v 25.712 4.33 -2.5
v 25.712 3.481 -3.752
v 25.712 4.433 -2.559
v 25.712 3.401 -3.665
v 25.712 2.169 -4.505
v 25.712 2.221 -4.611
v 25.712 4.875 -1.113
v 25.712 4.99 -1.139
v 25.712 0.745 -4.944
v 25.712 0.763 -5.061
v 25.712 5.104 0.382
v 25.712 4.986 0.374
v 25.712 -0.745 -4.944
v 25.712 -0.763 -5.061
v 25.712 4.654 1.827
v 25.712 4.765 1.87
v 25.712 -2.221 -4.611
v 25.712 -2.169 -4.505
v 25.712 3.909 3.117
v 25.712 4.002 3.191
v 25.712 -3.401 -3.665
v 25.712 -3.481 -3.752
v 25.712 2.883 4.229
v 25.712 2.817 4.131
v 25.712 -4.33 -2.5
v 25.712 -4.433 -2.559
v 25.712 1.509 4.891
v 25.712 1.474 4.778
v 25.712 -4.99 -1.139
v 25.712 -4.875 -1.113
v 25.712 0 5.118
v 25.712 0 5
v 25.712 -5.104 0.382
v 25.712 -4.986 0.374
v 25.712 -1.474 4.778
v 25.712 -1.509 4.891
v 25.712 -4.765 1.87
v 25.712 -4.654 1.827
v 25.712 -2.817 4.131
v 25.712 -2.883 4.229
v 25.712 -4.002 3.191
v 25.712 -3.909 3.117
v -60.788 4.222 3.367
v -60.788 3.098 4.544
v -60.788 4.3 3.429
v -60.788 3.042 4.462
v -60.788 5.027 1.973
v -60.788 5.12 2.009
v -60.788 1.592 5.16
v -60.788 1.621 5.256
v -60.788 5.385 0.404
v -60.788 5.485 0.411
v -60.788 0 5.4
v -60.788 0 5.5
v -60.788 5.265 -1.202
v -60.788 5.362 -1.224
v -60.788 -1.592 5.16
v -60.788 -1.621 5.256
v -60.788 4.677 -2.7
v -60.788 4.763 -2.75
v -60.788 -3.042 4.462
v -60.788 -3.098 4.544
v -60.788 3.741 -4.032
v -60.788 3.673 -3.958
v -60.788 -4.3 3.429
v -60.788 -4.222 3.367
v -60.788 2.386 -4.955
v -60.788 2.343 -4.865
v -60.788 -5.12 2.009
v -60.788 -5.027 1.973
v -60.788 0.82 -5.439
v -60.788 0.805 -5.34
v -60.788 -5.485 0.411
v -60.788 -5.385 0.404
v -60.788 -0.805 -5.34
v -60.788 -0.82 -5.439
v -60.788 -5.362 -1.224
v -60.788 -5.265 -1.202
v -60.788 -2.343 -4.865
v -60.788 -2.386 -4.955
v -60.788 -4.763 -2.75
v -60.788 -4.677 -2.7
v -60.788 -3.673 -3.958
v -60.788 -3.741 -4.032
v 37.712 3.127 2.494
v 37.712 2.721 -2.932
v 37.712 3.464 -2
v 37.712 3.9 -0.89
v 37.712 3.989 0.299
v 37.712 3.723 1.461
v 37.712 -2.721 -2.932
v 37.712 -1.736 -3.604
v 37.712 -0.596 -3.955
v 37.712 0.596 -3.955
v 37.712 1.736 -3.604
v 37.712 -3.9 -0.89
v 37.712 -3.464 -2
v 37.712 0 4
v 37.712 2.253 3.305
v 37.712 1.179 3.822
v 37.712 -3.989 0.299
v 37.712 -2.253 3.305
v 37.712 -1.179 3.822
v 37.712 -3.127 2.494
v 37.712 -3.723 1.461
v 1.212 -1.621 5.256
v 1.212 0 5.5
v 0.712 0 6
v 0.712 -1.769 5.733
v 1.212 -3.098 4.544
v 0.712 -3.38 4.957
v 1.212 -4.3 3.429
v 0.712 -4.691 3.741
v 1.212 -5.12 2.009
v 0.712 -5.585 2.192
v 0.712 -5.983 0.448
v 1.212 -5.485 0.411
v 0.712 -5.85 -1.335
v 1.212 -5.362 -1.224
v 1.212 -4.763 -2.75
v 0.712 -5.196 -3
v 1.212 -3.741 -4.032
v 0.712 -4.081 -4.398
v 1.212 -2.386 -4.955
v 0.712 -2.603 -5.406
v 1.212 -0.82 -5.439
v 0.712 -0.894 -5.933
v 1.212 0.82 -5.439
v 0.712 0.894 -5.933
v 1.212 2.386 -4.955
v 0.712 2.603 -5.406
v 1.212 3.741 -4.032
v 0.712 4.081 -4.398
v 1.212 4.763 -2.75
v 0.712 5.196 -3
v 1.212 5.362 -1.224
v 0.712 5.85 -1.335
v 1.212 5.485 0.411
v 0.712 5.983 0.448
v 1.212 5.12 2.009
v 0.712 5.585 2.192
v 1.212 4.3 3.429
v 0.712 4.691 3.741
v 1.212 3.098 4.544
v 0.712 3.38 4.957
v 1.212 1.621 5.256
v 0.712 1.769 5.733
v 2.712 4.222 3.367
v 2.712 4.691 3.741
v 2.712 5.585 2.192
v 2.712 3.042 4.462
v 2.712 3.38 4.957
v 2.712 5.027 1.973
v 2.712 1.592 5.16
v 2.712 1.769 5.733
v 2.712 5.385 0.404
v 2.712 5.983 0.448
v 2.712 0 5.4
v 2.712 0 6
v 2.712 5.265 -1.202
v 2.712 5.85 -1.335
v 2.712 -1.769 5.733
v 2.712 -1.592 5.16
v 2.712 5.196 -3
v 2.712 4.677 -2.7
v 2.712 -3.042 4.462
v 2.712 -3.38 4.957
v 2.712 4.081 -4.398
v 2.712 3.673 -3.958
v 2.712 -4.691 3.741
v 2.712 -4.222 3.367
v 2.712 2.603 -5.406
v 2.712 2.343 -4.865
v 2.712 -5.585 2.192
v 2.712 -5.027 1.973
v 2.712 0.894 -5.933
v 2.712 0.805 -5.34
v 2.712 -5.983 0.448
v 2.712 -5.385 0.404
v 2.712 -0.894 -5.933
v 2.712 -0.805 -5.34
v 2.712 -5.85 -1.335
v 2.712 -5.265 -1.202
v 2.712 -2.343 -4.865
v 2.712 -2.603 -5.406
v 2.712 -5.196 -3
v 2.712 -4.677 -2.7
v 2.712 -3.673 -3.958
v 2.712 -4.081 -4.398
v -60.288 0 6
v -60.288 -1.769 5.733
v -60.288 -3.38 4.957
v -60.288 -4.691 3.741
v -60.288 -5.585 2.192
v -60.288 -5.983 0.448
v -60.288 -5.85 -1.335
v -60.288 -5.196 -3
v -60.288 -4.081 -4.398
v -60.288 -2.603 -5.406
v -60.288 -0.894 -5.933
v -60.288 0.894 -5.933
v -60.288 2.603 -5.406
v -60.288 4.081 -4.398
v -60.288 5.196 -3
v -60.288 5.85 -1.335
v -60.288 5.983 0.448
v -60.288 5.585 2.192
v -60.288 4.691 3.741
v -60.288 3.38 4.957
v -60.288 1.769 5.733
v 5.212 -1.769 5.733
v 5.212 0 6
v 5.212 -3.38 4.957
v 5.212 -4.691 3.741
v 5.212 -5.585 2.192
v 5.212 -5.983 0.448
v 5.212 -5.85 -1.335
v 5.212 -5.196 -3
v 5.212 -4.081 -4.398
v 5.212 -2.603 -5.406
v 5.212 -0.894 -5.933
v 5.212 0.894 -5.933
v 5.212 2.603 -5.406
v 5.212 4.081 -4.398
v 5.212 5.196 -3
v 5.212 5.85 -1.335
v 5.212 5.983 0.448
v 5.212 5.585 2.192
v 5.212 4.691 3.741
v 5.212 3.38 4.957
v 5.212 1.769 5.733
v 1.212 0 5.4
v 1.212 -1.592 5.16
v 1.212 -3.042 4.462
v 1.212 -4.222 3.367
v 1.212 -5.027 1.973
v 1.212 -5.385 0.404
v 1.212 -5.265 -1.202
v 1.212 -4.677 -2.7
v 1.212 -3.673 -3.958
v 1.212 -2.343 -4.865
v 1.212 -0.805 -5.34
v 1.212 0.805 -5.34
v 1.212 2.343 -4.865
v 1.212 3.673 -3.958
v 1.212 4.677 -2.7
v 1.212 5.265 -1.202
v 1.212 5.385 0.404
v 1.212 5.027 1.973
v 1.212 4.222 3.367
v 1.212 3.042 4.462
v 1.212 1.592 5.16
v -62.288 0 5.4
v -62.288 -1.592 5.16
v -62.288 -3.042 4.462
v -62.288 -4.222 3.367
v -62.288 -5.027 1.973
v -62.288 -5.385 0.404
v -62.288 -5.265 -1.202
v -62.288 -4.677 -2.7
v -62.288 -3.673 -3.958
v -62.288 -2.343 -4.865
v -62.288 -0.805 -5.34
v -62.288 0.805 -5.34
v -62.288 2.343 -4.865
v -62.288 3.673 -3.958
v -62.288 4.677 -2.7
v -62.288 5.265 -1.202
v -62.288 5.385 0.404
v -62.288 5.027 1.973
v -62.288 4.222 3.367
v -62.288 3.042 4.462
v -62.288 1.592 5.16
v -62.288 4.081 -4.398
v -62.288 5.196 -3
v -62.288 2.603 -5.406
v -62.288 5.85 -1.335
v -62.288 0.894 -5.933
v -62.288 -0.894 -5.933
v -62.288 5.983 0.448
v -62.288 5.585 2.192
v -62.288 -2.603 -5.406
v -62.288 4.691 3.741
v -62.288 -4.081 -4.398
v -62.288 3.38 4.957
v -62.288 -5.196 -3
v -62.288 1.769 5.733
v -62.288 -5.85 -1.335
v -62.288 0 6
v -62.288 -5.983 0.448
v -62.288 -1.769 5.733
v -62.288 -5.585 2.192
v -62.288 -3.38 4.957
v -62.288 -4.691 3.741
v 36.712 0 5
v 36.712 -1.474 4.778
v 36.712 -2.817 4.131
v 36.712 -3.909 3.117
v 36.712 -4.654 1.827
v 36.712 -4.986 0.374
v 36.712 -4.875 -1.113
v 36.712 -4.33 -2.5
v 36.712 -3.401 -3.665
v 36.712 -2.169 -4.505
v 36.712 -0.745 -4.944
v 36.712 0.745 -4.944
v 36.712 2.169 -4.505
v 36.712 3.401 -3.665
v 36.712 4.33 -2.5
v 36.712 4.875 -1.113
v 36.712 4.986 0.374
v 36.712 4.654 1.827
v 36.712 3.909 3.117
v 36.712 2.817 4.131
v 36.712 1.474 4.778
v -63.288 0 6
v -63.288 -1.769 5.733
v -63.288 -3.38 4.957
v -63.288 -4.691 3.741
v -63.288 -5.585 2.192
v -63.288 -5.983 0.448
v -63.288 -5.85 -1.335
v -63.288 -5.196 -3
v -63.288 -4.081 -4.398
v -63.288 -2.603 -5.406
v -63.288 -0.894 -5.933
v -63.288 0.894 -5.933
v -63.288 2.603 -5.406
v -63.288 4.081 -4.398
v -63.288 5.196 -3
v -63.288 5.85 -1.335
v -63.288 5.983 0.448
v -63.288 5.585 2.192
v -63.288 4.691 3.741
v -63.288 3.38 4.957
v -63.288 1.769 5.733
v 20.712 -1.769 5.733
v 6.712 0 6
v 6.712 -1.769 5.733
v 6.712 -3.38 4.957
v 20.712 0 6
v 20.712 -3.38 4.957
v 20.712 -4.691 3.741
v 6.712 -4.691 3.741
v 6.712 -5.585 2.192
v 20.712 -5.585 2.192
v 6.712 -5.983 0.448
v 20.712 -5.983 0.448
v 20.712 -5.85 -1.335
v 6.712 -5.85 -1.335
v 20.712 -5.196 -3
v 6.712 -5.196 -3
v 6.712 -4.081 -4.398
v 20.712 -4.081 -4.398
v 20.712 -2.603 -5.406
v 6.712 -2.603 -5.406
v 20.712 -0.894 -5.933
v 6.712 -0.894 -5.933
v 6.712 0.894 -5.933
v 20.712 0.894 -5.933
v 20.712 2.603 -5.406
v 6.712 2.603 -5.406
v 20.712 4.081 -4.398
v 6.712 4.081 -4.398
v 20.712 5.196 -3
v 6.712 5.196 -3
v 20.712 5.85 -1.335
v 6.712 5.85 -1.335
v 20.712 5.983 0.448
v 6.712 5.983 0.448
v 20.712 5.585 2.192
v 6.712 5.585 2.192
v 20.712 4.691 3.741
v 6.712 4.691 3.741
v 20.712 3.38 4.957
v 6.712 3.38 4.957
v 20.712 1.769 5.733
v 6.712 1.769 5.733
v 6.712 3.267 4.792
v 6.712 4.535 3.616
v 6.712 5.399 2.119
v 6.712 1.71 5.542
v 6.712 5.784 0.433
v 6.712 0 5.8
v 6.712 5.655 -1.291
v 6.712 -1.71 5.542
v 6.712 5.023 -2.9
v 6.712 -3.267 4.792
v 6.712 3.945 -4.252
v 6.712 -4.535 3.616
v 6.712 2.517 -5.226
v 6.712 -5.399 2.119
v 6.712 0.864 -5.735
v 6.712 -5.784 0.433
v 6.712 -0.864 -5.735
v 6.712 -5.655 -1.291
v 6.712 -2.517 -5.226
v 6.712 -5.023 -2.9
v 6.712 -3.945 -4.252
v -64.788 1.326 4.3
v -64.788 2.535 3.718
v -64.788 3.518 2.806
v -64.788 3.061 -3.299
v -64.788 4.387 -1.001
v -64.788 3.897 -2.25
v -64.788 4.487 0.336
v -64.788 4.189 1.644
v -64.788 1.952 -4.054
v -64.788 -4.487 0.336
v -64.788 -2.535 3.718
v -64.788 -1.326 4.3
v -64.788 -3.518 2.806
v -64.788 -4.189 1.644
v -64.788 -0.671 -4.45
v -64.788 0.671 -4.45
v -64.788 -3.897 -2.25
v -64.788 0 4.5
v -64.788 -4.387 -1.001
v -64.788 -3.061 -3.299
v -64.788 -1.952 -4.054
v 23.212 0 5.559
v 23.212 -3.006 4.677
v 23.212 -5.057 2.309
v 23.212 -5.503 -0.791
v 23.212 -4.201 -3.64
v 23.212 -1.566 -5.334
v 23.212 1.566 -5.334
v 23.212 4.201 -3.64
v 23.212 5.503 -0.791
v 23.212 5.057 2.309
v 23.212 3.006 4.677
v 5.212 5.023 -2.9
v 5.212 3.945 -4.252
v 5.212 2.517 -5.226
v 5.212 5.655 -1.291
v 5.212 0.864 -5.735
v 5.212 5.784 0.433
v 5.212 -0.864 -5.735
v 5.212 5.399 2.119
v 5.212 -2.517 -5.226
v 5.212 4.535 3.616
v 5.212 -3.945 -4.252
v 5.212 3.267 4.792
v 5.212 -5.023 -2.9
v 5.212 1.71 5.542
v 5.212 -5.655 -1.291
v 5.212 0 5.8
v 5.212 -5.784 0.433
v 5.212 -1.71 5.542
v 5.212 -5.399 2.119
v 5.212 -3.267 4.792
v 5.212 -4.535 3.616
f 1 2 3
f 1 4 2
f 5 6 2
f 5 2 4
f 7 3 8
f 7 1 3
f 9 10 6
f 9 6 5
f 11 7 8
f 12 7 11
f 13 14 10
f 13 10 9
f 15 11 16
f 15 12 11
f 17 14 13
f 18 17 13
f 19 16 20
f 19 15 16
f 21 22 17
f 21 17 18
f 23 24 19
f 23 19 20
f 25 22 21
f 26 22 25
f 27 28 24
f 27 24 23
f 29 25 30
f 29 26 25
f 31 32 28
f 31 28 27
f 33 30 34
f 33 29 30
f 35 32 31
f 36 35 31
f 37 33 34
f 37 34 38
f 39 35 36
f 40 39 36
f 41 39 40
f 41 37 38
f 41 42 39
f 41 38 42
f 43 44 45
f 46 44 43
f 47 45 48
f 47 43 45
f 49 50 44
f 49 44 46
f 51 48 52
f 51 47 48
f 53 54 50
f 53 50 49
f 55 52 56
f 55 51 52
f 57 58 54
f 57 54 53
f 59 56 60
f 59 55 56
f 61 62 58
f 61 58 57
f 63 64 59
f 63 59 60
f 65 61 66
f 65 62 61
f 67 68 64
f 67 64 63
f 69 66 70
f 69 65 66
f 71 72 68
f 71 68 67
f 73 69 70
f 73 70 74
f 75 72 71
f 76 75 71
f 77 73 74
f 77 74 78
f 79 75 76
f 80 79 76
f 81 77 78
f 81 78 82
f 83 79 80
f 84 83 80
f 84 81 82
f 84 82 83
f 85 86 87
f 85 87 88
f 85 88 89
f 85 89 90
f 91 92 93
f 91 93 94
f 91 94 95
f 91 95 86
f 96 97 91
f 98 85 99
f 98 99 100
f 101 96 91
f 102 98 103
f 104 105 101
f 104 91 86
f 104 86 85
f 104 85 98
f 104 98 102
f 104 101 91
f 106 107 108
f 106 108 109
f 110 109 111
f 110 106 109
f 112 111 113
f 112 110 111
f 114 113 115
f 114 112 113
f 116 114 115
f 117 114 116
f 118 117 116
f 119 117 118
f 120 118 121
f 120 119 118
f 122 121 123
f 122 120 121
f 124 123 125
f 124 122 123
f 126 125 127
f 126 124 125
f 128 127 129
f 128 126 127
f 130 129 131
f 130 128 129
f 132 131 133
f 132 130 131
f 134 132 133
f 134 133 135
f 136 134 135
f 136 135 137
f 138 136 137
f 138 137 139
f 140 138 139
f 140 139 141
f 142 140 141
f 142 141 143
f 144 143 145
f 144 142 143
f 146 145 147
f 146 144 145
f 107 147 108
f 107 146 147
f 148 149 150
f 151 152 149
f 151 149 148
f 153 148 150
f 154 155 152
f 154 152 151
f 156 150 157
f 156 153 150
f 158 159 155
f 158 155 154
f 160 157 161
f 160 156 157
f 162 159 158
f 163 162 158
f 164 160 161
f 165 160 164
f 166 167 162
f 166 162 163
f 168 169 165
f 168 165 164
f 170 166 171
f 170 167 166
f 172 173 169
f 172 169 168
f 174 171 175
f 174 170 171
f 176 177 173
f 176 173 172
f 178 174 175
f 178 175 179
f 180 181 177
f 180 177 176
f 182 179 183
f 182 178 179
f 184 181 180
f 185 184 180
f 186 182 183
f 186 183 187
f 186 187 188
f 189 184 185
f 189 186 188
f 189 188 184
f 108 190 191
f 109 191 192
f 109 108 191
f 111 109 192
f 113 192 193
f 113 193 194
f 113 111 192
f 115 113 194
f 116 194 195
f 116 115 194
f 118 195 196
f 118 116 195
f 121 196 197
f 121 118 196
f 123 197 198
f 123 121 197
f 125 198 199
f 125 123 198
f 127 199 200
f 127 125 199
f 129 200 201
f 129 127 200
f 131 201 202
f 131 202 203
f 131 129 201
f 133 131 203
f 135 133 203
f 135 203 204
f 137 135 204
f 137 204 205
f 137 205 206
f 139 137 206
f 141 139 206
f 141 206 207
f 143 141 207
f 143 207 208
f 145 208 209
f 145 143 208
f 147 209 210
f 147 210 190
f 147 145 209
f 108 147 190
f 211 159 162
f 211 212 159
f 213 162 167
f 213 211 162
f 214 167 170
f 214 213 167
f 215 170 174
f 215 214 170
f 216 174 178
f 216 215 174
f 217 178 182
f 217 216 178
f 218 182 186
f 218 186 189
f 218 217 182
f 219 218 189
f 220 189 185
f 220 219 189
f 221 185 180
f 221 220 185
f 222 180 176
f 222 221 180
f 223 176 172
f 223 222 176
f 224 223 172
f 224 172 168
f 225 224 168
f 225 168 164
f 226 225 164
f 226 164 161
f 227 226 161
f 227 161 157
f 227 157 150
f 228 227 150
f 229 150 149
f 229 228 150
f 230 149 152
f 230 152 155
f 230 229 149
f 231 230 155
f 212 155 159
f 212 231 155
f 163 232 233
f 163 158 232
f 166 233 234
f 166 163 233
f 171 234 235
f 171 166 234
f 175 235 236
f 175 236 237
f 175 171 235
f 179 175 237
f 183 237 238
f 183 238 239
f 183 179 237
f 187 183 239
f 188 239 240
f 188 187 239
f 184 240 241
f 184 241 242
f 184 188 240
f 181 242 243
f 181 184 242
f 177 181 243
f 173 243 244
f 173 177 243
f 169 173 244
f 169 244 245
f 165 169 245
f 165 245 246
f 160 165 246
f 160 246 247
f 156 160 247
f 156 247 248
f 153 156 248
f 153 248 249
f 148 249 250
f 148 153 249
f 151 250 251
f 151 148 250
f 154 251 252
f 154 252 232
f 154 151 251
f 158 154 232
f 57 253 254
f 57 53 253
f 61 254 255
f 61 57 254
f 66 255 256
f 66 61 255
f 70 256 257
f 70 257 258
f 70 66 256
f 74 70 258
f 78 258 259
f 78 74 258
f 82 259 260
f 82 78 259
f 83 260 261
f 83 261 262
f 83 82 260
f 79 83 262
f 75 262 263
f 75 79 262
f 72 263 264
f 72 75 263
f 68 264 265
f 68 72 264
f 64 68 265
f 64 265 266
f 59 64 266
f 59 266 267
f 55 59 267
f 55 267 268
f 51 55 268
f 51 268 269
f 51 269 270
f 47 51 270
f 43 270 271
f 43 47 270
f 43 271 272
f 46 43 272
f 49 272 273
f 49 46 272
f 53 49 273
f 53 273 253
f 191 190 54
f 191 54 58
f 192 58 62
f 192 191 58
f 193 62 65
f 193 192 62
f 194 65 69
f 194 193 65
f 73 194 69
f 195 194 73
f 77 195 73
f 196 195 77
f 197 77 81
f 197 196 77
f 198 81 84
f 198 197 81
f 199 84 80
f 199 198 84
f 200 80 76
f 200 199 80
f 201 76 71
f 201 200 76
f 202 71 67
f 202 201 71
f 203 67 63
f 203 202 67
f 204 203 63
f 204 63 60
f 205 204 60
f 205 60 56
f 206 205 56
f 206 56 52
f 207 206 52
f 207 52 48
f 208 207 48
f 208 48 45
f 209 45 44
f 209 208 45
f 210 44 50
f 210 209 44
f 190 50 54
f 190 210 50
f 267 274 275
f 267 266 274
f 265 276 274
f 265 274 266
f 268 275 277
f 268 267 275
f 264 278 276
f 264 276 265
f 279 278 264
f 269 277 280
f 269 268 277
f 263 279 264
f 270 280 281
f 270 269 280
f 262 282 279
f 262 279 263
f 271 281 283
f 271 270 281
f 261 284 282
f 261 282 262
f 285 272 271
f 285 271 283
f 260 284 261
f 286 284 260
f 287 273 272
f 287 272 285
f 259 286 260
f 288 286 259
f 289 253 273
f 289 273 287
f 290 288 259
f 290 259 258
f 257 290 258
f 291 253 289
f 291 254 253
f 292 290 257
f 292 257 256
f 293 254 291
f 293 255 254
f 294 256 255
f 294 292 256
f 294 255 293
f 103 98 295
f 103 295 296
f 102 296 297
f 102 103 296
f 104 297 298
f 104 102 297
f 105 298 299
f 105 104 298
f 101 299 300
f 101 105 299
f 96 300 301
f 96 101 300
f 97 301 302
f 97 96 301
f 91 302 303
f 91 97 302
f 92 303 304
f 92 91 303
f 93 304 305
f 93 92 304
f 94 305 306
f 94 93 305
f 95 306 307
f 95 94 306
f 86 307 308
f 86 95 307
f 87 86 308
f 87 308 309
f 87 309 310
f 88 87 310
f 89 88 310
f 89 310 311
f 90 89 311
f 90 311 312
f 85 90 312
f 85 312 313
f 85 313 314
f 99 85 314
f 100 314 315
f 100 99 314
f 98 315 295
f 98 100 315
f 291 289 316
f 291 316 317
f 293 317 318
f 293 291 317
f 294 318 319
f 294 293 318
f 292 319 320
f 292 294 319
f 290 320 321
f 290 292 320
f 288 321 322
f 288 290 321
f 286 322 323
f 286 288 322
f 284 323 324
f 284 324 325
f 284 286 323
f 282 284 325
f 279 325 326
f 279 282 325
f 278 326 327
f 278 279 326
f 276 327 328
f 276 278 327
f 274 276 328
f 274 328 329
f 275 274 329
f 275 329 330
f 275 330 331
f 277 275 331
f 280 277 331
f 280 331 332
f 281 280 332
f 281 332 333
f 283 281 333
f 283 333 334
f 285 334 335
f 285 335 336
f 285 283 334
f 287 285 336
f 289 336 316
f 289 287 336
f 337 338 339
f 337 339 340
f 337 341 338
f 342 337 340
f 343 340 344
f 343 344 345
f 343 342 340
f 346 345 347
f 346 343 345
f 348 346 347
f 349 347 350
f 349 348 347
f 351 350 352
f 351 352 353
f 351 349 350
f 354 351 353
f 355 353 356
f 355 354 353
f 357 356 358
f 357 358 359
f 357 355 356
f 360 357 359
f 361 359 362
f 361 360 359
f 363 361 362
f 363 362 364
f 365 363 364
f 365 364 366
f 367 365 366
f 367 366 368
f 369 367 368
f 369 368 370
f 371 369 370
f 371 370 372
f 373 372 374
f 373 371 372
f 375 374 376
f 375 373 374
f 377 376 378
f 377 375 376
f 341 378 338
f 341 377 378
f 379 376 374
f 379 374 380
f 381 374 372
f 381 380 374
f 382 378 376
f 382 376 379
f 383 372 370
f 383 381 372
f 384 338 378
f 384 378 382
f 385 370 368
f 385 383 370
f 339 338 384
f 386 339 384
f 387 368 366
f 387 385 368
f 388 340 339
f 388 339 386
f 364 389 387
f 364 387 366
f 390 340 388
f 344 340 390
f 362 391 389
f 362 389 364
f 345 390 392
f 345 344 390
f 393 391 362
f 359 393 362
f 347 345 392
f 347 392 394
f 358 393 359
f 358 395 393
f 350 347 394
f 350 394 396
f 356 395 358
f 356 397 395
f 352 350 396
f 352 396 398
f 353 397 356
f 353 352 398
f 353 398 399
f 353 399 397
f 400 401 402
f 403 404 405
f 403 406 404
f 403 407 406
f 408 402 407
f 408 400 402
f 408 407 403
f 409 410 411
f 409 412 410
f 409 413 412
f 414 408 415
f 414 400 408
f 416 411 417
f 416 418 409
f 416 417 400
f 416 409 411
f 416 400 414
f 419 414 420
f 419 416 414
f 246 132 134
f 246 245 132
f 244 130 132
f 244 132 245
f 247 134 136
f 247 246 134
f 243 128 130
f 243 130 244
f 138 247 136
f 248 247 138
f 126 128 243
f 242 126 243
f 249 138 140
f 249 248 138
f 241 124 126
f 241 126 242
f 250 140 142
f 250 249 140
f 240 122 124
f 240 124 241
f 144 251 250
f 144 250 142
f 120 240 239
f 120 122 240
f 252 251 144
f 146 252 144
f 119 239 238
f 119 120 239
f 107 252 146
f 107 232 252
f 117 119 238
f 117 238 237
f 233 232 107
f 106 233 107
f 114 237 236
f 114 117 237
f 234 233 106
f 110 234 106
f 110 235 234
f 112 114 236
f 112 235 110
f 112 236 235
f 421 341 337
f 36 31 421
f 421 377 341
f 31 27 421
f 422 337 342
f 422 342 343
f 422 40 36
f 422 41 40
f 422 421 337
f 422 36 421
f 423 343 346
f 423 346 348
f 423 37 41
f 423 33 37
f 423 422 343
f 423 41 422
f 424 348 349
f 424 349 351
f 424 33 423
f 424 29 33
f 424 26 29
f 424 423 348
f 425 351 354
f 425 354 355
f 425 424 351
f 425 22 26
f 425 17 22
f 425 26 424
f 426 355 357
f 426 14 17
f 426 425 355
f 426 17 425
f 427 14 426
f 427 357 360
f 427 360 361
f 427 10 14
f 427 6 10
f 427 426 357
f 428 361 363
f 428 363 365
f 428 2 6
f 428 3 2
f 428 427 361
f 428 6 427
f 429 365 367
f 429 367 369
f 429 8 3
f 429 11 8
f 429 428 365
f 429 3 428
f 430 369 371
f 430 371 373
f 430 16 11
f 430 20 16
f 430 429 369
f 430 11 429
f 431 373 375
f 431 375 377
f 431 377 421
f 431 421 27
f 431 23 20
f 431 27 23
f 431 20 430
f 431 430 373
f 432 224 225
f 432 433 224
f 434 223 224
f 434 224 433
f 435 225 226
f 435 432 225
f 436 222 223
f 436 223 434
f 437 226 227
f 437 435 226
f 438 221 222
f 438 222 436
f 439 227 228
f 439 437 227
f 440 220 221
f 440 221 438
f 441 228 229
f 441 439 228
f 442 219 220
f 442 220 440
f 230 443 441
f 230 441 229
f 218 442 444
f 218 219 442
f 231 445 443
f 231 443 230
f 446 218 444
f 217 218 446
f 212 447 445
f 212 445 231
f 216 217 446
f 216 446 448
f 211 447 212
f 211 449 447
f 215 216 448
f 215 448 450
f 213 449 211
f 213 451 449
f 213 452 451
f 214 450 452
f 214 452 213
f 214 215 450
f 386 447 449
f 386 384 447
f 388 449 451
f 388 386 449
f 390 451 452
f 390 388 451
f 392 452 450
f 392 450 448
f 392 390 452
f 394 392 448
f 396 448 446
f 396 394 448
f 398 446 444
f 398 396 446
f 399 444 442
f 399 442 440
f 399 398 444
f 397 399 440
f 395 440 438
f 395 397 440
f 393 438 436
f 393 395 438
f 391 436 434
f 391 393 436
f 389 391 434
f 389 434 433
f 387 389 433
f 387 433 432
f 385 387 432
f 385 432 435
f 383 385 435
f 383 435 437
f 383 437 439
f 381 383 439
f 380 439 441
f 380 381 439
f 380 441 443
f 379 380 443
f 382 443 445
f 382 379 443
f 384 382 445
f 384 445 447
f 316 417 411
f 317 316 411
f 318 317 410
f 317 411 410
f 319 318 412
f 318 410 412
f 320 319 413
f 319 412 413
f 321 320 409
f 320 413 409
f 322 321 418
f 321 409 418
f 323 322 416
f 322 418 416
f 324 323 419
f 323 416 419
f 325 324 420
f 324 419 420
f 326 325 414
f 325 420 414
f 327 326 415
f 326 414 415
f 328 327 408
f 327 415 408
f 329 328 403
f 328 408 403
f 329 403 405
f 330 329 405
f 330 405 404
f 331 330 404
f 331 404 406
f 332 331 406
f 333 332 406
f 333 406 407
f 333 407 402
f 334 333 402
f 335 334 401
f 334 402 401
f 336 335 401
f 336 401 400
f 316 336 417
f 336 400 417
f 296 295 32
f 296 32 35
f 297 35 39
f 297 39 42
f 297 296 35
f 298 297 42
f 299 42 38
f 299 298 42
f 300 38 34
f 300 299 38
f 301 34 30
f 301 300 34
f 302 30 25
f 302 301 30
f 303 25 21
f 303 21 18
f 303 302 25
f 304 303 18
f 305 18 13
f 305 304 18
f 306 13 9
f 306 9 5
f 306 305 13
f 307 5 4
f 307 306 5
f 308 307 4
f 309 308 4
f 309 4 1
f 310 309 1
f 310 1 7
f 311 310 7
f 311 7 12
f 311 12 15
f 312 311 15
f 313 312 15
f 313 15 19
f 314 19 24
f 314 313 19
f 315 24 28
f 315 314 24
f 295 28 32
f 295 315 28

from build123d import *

# Parameters (mm, degrees)
CHANFREIN1_SIZE = 1
CHANFREIN2_SIZE = 1.5
CHANFREIN3_SIZE = 0.5


with BuildPart() as part:
    # Esquisse1 → Révolution1 (revolve)
    with BuildSketch(Plane.XY, mode=Mode.PRIVATE) as r_volution1_sk:
        Polygon((-64.788489135, 0), (-64.788489135, 6), (-62.288489135, 6), (-62.288489135, 5.4), (-60.788489135, 5.4), (-60.788489135, 6), (1.211510865, 6), (1.211510865, 5.4), (2.711510865, 5.4), (2.711510865, 6), (5.211510865, 6), (5.211510865, 5.8), (6.711510865, 5.8), (6.711510865, 6), (20.711510865, 6), (25.711510865, 5.118365096), (25.711510865, 5), (37.711510865, 5), (37.711510865, 0), align=None)
    revolve(r_volution1_sk.sketch.rotate(Axis((-77.674282493, 0, 0), (1, 0, 0)), 90), axis=Axis((-77.674282493, 0, 0), (1, 0, 0)))

    # Chanfrein1
    chanfrein1_edges = [part.edges().sort_by_distance(p)[0] for p in [
        (37.711510865, 0, -5),
    ]]
    chamfer(chanfrein1_edges, length=CHANFREIN1_SIZE)

    # Chanfrein2
    chanfrein2_edges = [part.edges().sort_by_distance(p)[0] for p in [
        (-64.788489135, 0, -6),
    ]]
    chamfer(chanfrein2_edges, length=CHANFREIN2_SIZE)

    # Chanfrein3
    chanfrein3_edges = [part.edges().sort_by_distance(p)[0] for p in [
        (1.211510865, 0, -6),
        (-60.788489135, 0, -6),
    ]]
    chamfer(chanfrein3_edges, length=CHANFREIN3_SIZE)


solid = part.part
